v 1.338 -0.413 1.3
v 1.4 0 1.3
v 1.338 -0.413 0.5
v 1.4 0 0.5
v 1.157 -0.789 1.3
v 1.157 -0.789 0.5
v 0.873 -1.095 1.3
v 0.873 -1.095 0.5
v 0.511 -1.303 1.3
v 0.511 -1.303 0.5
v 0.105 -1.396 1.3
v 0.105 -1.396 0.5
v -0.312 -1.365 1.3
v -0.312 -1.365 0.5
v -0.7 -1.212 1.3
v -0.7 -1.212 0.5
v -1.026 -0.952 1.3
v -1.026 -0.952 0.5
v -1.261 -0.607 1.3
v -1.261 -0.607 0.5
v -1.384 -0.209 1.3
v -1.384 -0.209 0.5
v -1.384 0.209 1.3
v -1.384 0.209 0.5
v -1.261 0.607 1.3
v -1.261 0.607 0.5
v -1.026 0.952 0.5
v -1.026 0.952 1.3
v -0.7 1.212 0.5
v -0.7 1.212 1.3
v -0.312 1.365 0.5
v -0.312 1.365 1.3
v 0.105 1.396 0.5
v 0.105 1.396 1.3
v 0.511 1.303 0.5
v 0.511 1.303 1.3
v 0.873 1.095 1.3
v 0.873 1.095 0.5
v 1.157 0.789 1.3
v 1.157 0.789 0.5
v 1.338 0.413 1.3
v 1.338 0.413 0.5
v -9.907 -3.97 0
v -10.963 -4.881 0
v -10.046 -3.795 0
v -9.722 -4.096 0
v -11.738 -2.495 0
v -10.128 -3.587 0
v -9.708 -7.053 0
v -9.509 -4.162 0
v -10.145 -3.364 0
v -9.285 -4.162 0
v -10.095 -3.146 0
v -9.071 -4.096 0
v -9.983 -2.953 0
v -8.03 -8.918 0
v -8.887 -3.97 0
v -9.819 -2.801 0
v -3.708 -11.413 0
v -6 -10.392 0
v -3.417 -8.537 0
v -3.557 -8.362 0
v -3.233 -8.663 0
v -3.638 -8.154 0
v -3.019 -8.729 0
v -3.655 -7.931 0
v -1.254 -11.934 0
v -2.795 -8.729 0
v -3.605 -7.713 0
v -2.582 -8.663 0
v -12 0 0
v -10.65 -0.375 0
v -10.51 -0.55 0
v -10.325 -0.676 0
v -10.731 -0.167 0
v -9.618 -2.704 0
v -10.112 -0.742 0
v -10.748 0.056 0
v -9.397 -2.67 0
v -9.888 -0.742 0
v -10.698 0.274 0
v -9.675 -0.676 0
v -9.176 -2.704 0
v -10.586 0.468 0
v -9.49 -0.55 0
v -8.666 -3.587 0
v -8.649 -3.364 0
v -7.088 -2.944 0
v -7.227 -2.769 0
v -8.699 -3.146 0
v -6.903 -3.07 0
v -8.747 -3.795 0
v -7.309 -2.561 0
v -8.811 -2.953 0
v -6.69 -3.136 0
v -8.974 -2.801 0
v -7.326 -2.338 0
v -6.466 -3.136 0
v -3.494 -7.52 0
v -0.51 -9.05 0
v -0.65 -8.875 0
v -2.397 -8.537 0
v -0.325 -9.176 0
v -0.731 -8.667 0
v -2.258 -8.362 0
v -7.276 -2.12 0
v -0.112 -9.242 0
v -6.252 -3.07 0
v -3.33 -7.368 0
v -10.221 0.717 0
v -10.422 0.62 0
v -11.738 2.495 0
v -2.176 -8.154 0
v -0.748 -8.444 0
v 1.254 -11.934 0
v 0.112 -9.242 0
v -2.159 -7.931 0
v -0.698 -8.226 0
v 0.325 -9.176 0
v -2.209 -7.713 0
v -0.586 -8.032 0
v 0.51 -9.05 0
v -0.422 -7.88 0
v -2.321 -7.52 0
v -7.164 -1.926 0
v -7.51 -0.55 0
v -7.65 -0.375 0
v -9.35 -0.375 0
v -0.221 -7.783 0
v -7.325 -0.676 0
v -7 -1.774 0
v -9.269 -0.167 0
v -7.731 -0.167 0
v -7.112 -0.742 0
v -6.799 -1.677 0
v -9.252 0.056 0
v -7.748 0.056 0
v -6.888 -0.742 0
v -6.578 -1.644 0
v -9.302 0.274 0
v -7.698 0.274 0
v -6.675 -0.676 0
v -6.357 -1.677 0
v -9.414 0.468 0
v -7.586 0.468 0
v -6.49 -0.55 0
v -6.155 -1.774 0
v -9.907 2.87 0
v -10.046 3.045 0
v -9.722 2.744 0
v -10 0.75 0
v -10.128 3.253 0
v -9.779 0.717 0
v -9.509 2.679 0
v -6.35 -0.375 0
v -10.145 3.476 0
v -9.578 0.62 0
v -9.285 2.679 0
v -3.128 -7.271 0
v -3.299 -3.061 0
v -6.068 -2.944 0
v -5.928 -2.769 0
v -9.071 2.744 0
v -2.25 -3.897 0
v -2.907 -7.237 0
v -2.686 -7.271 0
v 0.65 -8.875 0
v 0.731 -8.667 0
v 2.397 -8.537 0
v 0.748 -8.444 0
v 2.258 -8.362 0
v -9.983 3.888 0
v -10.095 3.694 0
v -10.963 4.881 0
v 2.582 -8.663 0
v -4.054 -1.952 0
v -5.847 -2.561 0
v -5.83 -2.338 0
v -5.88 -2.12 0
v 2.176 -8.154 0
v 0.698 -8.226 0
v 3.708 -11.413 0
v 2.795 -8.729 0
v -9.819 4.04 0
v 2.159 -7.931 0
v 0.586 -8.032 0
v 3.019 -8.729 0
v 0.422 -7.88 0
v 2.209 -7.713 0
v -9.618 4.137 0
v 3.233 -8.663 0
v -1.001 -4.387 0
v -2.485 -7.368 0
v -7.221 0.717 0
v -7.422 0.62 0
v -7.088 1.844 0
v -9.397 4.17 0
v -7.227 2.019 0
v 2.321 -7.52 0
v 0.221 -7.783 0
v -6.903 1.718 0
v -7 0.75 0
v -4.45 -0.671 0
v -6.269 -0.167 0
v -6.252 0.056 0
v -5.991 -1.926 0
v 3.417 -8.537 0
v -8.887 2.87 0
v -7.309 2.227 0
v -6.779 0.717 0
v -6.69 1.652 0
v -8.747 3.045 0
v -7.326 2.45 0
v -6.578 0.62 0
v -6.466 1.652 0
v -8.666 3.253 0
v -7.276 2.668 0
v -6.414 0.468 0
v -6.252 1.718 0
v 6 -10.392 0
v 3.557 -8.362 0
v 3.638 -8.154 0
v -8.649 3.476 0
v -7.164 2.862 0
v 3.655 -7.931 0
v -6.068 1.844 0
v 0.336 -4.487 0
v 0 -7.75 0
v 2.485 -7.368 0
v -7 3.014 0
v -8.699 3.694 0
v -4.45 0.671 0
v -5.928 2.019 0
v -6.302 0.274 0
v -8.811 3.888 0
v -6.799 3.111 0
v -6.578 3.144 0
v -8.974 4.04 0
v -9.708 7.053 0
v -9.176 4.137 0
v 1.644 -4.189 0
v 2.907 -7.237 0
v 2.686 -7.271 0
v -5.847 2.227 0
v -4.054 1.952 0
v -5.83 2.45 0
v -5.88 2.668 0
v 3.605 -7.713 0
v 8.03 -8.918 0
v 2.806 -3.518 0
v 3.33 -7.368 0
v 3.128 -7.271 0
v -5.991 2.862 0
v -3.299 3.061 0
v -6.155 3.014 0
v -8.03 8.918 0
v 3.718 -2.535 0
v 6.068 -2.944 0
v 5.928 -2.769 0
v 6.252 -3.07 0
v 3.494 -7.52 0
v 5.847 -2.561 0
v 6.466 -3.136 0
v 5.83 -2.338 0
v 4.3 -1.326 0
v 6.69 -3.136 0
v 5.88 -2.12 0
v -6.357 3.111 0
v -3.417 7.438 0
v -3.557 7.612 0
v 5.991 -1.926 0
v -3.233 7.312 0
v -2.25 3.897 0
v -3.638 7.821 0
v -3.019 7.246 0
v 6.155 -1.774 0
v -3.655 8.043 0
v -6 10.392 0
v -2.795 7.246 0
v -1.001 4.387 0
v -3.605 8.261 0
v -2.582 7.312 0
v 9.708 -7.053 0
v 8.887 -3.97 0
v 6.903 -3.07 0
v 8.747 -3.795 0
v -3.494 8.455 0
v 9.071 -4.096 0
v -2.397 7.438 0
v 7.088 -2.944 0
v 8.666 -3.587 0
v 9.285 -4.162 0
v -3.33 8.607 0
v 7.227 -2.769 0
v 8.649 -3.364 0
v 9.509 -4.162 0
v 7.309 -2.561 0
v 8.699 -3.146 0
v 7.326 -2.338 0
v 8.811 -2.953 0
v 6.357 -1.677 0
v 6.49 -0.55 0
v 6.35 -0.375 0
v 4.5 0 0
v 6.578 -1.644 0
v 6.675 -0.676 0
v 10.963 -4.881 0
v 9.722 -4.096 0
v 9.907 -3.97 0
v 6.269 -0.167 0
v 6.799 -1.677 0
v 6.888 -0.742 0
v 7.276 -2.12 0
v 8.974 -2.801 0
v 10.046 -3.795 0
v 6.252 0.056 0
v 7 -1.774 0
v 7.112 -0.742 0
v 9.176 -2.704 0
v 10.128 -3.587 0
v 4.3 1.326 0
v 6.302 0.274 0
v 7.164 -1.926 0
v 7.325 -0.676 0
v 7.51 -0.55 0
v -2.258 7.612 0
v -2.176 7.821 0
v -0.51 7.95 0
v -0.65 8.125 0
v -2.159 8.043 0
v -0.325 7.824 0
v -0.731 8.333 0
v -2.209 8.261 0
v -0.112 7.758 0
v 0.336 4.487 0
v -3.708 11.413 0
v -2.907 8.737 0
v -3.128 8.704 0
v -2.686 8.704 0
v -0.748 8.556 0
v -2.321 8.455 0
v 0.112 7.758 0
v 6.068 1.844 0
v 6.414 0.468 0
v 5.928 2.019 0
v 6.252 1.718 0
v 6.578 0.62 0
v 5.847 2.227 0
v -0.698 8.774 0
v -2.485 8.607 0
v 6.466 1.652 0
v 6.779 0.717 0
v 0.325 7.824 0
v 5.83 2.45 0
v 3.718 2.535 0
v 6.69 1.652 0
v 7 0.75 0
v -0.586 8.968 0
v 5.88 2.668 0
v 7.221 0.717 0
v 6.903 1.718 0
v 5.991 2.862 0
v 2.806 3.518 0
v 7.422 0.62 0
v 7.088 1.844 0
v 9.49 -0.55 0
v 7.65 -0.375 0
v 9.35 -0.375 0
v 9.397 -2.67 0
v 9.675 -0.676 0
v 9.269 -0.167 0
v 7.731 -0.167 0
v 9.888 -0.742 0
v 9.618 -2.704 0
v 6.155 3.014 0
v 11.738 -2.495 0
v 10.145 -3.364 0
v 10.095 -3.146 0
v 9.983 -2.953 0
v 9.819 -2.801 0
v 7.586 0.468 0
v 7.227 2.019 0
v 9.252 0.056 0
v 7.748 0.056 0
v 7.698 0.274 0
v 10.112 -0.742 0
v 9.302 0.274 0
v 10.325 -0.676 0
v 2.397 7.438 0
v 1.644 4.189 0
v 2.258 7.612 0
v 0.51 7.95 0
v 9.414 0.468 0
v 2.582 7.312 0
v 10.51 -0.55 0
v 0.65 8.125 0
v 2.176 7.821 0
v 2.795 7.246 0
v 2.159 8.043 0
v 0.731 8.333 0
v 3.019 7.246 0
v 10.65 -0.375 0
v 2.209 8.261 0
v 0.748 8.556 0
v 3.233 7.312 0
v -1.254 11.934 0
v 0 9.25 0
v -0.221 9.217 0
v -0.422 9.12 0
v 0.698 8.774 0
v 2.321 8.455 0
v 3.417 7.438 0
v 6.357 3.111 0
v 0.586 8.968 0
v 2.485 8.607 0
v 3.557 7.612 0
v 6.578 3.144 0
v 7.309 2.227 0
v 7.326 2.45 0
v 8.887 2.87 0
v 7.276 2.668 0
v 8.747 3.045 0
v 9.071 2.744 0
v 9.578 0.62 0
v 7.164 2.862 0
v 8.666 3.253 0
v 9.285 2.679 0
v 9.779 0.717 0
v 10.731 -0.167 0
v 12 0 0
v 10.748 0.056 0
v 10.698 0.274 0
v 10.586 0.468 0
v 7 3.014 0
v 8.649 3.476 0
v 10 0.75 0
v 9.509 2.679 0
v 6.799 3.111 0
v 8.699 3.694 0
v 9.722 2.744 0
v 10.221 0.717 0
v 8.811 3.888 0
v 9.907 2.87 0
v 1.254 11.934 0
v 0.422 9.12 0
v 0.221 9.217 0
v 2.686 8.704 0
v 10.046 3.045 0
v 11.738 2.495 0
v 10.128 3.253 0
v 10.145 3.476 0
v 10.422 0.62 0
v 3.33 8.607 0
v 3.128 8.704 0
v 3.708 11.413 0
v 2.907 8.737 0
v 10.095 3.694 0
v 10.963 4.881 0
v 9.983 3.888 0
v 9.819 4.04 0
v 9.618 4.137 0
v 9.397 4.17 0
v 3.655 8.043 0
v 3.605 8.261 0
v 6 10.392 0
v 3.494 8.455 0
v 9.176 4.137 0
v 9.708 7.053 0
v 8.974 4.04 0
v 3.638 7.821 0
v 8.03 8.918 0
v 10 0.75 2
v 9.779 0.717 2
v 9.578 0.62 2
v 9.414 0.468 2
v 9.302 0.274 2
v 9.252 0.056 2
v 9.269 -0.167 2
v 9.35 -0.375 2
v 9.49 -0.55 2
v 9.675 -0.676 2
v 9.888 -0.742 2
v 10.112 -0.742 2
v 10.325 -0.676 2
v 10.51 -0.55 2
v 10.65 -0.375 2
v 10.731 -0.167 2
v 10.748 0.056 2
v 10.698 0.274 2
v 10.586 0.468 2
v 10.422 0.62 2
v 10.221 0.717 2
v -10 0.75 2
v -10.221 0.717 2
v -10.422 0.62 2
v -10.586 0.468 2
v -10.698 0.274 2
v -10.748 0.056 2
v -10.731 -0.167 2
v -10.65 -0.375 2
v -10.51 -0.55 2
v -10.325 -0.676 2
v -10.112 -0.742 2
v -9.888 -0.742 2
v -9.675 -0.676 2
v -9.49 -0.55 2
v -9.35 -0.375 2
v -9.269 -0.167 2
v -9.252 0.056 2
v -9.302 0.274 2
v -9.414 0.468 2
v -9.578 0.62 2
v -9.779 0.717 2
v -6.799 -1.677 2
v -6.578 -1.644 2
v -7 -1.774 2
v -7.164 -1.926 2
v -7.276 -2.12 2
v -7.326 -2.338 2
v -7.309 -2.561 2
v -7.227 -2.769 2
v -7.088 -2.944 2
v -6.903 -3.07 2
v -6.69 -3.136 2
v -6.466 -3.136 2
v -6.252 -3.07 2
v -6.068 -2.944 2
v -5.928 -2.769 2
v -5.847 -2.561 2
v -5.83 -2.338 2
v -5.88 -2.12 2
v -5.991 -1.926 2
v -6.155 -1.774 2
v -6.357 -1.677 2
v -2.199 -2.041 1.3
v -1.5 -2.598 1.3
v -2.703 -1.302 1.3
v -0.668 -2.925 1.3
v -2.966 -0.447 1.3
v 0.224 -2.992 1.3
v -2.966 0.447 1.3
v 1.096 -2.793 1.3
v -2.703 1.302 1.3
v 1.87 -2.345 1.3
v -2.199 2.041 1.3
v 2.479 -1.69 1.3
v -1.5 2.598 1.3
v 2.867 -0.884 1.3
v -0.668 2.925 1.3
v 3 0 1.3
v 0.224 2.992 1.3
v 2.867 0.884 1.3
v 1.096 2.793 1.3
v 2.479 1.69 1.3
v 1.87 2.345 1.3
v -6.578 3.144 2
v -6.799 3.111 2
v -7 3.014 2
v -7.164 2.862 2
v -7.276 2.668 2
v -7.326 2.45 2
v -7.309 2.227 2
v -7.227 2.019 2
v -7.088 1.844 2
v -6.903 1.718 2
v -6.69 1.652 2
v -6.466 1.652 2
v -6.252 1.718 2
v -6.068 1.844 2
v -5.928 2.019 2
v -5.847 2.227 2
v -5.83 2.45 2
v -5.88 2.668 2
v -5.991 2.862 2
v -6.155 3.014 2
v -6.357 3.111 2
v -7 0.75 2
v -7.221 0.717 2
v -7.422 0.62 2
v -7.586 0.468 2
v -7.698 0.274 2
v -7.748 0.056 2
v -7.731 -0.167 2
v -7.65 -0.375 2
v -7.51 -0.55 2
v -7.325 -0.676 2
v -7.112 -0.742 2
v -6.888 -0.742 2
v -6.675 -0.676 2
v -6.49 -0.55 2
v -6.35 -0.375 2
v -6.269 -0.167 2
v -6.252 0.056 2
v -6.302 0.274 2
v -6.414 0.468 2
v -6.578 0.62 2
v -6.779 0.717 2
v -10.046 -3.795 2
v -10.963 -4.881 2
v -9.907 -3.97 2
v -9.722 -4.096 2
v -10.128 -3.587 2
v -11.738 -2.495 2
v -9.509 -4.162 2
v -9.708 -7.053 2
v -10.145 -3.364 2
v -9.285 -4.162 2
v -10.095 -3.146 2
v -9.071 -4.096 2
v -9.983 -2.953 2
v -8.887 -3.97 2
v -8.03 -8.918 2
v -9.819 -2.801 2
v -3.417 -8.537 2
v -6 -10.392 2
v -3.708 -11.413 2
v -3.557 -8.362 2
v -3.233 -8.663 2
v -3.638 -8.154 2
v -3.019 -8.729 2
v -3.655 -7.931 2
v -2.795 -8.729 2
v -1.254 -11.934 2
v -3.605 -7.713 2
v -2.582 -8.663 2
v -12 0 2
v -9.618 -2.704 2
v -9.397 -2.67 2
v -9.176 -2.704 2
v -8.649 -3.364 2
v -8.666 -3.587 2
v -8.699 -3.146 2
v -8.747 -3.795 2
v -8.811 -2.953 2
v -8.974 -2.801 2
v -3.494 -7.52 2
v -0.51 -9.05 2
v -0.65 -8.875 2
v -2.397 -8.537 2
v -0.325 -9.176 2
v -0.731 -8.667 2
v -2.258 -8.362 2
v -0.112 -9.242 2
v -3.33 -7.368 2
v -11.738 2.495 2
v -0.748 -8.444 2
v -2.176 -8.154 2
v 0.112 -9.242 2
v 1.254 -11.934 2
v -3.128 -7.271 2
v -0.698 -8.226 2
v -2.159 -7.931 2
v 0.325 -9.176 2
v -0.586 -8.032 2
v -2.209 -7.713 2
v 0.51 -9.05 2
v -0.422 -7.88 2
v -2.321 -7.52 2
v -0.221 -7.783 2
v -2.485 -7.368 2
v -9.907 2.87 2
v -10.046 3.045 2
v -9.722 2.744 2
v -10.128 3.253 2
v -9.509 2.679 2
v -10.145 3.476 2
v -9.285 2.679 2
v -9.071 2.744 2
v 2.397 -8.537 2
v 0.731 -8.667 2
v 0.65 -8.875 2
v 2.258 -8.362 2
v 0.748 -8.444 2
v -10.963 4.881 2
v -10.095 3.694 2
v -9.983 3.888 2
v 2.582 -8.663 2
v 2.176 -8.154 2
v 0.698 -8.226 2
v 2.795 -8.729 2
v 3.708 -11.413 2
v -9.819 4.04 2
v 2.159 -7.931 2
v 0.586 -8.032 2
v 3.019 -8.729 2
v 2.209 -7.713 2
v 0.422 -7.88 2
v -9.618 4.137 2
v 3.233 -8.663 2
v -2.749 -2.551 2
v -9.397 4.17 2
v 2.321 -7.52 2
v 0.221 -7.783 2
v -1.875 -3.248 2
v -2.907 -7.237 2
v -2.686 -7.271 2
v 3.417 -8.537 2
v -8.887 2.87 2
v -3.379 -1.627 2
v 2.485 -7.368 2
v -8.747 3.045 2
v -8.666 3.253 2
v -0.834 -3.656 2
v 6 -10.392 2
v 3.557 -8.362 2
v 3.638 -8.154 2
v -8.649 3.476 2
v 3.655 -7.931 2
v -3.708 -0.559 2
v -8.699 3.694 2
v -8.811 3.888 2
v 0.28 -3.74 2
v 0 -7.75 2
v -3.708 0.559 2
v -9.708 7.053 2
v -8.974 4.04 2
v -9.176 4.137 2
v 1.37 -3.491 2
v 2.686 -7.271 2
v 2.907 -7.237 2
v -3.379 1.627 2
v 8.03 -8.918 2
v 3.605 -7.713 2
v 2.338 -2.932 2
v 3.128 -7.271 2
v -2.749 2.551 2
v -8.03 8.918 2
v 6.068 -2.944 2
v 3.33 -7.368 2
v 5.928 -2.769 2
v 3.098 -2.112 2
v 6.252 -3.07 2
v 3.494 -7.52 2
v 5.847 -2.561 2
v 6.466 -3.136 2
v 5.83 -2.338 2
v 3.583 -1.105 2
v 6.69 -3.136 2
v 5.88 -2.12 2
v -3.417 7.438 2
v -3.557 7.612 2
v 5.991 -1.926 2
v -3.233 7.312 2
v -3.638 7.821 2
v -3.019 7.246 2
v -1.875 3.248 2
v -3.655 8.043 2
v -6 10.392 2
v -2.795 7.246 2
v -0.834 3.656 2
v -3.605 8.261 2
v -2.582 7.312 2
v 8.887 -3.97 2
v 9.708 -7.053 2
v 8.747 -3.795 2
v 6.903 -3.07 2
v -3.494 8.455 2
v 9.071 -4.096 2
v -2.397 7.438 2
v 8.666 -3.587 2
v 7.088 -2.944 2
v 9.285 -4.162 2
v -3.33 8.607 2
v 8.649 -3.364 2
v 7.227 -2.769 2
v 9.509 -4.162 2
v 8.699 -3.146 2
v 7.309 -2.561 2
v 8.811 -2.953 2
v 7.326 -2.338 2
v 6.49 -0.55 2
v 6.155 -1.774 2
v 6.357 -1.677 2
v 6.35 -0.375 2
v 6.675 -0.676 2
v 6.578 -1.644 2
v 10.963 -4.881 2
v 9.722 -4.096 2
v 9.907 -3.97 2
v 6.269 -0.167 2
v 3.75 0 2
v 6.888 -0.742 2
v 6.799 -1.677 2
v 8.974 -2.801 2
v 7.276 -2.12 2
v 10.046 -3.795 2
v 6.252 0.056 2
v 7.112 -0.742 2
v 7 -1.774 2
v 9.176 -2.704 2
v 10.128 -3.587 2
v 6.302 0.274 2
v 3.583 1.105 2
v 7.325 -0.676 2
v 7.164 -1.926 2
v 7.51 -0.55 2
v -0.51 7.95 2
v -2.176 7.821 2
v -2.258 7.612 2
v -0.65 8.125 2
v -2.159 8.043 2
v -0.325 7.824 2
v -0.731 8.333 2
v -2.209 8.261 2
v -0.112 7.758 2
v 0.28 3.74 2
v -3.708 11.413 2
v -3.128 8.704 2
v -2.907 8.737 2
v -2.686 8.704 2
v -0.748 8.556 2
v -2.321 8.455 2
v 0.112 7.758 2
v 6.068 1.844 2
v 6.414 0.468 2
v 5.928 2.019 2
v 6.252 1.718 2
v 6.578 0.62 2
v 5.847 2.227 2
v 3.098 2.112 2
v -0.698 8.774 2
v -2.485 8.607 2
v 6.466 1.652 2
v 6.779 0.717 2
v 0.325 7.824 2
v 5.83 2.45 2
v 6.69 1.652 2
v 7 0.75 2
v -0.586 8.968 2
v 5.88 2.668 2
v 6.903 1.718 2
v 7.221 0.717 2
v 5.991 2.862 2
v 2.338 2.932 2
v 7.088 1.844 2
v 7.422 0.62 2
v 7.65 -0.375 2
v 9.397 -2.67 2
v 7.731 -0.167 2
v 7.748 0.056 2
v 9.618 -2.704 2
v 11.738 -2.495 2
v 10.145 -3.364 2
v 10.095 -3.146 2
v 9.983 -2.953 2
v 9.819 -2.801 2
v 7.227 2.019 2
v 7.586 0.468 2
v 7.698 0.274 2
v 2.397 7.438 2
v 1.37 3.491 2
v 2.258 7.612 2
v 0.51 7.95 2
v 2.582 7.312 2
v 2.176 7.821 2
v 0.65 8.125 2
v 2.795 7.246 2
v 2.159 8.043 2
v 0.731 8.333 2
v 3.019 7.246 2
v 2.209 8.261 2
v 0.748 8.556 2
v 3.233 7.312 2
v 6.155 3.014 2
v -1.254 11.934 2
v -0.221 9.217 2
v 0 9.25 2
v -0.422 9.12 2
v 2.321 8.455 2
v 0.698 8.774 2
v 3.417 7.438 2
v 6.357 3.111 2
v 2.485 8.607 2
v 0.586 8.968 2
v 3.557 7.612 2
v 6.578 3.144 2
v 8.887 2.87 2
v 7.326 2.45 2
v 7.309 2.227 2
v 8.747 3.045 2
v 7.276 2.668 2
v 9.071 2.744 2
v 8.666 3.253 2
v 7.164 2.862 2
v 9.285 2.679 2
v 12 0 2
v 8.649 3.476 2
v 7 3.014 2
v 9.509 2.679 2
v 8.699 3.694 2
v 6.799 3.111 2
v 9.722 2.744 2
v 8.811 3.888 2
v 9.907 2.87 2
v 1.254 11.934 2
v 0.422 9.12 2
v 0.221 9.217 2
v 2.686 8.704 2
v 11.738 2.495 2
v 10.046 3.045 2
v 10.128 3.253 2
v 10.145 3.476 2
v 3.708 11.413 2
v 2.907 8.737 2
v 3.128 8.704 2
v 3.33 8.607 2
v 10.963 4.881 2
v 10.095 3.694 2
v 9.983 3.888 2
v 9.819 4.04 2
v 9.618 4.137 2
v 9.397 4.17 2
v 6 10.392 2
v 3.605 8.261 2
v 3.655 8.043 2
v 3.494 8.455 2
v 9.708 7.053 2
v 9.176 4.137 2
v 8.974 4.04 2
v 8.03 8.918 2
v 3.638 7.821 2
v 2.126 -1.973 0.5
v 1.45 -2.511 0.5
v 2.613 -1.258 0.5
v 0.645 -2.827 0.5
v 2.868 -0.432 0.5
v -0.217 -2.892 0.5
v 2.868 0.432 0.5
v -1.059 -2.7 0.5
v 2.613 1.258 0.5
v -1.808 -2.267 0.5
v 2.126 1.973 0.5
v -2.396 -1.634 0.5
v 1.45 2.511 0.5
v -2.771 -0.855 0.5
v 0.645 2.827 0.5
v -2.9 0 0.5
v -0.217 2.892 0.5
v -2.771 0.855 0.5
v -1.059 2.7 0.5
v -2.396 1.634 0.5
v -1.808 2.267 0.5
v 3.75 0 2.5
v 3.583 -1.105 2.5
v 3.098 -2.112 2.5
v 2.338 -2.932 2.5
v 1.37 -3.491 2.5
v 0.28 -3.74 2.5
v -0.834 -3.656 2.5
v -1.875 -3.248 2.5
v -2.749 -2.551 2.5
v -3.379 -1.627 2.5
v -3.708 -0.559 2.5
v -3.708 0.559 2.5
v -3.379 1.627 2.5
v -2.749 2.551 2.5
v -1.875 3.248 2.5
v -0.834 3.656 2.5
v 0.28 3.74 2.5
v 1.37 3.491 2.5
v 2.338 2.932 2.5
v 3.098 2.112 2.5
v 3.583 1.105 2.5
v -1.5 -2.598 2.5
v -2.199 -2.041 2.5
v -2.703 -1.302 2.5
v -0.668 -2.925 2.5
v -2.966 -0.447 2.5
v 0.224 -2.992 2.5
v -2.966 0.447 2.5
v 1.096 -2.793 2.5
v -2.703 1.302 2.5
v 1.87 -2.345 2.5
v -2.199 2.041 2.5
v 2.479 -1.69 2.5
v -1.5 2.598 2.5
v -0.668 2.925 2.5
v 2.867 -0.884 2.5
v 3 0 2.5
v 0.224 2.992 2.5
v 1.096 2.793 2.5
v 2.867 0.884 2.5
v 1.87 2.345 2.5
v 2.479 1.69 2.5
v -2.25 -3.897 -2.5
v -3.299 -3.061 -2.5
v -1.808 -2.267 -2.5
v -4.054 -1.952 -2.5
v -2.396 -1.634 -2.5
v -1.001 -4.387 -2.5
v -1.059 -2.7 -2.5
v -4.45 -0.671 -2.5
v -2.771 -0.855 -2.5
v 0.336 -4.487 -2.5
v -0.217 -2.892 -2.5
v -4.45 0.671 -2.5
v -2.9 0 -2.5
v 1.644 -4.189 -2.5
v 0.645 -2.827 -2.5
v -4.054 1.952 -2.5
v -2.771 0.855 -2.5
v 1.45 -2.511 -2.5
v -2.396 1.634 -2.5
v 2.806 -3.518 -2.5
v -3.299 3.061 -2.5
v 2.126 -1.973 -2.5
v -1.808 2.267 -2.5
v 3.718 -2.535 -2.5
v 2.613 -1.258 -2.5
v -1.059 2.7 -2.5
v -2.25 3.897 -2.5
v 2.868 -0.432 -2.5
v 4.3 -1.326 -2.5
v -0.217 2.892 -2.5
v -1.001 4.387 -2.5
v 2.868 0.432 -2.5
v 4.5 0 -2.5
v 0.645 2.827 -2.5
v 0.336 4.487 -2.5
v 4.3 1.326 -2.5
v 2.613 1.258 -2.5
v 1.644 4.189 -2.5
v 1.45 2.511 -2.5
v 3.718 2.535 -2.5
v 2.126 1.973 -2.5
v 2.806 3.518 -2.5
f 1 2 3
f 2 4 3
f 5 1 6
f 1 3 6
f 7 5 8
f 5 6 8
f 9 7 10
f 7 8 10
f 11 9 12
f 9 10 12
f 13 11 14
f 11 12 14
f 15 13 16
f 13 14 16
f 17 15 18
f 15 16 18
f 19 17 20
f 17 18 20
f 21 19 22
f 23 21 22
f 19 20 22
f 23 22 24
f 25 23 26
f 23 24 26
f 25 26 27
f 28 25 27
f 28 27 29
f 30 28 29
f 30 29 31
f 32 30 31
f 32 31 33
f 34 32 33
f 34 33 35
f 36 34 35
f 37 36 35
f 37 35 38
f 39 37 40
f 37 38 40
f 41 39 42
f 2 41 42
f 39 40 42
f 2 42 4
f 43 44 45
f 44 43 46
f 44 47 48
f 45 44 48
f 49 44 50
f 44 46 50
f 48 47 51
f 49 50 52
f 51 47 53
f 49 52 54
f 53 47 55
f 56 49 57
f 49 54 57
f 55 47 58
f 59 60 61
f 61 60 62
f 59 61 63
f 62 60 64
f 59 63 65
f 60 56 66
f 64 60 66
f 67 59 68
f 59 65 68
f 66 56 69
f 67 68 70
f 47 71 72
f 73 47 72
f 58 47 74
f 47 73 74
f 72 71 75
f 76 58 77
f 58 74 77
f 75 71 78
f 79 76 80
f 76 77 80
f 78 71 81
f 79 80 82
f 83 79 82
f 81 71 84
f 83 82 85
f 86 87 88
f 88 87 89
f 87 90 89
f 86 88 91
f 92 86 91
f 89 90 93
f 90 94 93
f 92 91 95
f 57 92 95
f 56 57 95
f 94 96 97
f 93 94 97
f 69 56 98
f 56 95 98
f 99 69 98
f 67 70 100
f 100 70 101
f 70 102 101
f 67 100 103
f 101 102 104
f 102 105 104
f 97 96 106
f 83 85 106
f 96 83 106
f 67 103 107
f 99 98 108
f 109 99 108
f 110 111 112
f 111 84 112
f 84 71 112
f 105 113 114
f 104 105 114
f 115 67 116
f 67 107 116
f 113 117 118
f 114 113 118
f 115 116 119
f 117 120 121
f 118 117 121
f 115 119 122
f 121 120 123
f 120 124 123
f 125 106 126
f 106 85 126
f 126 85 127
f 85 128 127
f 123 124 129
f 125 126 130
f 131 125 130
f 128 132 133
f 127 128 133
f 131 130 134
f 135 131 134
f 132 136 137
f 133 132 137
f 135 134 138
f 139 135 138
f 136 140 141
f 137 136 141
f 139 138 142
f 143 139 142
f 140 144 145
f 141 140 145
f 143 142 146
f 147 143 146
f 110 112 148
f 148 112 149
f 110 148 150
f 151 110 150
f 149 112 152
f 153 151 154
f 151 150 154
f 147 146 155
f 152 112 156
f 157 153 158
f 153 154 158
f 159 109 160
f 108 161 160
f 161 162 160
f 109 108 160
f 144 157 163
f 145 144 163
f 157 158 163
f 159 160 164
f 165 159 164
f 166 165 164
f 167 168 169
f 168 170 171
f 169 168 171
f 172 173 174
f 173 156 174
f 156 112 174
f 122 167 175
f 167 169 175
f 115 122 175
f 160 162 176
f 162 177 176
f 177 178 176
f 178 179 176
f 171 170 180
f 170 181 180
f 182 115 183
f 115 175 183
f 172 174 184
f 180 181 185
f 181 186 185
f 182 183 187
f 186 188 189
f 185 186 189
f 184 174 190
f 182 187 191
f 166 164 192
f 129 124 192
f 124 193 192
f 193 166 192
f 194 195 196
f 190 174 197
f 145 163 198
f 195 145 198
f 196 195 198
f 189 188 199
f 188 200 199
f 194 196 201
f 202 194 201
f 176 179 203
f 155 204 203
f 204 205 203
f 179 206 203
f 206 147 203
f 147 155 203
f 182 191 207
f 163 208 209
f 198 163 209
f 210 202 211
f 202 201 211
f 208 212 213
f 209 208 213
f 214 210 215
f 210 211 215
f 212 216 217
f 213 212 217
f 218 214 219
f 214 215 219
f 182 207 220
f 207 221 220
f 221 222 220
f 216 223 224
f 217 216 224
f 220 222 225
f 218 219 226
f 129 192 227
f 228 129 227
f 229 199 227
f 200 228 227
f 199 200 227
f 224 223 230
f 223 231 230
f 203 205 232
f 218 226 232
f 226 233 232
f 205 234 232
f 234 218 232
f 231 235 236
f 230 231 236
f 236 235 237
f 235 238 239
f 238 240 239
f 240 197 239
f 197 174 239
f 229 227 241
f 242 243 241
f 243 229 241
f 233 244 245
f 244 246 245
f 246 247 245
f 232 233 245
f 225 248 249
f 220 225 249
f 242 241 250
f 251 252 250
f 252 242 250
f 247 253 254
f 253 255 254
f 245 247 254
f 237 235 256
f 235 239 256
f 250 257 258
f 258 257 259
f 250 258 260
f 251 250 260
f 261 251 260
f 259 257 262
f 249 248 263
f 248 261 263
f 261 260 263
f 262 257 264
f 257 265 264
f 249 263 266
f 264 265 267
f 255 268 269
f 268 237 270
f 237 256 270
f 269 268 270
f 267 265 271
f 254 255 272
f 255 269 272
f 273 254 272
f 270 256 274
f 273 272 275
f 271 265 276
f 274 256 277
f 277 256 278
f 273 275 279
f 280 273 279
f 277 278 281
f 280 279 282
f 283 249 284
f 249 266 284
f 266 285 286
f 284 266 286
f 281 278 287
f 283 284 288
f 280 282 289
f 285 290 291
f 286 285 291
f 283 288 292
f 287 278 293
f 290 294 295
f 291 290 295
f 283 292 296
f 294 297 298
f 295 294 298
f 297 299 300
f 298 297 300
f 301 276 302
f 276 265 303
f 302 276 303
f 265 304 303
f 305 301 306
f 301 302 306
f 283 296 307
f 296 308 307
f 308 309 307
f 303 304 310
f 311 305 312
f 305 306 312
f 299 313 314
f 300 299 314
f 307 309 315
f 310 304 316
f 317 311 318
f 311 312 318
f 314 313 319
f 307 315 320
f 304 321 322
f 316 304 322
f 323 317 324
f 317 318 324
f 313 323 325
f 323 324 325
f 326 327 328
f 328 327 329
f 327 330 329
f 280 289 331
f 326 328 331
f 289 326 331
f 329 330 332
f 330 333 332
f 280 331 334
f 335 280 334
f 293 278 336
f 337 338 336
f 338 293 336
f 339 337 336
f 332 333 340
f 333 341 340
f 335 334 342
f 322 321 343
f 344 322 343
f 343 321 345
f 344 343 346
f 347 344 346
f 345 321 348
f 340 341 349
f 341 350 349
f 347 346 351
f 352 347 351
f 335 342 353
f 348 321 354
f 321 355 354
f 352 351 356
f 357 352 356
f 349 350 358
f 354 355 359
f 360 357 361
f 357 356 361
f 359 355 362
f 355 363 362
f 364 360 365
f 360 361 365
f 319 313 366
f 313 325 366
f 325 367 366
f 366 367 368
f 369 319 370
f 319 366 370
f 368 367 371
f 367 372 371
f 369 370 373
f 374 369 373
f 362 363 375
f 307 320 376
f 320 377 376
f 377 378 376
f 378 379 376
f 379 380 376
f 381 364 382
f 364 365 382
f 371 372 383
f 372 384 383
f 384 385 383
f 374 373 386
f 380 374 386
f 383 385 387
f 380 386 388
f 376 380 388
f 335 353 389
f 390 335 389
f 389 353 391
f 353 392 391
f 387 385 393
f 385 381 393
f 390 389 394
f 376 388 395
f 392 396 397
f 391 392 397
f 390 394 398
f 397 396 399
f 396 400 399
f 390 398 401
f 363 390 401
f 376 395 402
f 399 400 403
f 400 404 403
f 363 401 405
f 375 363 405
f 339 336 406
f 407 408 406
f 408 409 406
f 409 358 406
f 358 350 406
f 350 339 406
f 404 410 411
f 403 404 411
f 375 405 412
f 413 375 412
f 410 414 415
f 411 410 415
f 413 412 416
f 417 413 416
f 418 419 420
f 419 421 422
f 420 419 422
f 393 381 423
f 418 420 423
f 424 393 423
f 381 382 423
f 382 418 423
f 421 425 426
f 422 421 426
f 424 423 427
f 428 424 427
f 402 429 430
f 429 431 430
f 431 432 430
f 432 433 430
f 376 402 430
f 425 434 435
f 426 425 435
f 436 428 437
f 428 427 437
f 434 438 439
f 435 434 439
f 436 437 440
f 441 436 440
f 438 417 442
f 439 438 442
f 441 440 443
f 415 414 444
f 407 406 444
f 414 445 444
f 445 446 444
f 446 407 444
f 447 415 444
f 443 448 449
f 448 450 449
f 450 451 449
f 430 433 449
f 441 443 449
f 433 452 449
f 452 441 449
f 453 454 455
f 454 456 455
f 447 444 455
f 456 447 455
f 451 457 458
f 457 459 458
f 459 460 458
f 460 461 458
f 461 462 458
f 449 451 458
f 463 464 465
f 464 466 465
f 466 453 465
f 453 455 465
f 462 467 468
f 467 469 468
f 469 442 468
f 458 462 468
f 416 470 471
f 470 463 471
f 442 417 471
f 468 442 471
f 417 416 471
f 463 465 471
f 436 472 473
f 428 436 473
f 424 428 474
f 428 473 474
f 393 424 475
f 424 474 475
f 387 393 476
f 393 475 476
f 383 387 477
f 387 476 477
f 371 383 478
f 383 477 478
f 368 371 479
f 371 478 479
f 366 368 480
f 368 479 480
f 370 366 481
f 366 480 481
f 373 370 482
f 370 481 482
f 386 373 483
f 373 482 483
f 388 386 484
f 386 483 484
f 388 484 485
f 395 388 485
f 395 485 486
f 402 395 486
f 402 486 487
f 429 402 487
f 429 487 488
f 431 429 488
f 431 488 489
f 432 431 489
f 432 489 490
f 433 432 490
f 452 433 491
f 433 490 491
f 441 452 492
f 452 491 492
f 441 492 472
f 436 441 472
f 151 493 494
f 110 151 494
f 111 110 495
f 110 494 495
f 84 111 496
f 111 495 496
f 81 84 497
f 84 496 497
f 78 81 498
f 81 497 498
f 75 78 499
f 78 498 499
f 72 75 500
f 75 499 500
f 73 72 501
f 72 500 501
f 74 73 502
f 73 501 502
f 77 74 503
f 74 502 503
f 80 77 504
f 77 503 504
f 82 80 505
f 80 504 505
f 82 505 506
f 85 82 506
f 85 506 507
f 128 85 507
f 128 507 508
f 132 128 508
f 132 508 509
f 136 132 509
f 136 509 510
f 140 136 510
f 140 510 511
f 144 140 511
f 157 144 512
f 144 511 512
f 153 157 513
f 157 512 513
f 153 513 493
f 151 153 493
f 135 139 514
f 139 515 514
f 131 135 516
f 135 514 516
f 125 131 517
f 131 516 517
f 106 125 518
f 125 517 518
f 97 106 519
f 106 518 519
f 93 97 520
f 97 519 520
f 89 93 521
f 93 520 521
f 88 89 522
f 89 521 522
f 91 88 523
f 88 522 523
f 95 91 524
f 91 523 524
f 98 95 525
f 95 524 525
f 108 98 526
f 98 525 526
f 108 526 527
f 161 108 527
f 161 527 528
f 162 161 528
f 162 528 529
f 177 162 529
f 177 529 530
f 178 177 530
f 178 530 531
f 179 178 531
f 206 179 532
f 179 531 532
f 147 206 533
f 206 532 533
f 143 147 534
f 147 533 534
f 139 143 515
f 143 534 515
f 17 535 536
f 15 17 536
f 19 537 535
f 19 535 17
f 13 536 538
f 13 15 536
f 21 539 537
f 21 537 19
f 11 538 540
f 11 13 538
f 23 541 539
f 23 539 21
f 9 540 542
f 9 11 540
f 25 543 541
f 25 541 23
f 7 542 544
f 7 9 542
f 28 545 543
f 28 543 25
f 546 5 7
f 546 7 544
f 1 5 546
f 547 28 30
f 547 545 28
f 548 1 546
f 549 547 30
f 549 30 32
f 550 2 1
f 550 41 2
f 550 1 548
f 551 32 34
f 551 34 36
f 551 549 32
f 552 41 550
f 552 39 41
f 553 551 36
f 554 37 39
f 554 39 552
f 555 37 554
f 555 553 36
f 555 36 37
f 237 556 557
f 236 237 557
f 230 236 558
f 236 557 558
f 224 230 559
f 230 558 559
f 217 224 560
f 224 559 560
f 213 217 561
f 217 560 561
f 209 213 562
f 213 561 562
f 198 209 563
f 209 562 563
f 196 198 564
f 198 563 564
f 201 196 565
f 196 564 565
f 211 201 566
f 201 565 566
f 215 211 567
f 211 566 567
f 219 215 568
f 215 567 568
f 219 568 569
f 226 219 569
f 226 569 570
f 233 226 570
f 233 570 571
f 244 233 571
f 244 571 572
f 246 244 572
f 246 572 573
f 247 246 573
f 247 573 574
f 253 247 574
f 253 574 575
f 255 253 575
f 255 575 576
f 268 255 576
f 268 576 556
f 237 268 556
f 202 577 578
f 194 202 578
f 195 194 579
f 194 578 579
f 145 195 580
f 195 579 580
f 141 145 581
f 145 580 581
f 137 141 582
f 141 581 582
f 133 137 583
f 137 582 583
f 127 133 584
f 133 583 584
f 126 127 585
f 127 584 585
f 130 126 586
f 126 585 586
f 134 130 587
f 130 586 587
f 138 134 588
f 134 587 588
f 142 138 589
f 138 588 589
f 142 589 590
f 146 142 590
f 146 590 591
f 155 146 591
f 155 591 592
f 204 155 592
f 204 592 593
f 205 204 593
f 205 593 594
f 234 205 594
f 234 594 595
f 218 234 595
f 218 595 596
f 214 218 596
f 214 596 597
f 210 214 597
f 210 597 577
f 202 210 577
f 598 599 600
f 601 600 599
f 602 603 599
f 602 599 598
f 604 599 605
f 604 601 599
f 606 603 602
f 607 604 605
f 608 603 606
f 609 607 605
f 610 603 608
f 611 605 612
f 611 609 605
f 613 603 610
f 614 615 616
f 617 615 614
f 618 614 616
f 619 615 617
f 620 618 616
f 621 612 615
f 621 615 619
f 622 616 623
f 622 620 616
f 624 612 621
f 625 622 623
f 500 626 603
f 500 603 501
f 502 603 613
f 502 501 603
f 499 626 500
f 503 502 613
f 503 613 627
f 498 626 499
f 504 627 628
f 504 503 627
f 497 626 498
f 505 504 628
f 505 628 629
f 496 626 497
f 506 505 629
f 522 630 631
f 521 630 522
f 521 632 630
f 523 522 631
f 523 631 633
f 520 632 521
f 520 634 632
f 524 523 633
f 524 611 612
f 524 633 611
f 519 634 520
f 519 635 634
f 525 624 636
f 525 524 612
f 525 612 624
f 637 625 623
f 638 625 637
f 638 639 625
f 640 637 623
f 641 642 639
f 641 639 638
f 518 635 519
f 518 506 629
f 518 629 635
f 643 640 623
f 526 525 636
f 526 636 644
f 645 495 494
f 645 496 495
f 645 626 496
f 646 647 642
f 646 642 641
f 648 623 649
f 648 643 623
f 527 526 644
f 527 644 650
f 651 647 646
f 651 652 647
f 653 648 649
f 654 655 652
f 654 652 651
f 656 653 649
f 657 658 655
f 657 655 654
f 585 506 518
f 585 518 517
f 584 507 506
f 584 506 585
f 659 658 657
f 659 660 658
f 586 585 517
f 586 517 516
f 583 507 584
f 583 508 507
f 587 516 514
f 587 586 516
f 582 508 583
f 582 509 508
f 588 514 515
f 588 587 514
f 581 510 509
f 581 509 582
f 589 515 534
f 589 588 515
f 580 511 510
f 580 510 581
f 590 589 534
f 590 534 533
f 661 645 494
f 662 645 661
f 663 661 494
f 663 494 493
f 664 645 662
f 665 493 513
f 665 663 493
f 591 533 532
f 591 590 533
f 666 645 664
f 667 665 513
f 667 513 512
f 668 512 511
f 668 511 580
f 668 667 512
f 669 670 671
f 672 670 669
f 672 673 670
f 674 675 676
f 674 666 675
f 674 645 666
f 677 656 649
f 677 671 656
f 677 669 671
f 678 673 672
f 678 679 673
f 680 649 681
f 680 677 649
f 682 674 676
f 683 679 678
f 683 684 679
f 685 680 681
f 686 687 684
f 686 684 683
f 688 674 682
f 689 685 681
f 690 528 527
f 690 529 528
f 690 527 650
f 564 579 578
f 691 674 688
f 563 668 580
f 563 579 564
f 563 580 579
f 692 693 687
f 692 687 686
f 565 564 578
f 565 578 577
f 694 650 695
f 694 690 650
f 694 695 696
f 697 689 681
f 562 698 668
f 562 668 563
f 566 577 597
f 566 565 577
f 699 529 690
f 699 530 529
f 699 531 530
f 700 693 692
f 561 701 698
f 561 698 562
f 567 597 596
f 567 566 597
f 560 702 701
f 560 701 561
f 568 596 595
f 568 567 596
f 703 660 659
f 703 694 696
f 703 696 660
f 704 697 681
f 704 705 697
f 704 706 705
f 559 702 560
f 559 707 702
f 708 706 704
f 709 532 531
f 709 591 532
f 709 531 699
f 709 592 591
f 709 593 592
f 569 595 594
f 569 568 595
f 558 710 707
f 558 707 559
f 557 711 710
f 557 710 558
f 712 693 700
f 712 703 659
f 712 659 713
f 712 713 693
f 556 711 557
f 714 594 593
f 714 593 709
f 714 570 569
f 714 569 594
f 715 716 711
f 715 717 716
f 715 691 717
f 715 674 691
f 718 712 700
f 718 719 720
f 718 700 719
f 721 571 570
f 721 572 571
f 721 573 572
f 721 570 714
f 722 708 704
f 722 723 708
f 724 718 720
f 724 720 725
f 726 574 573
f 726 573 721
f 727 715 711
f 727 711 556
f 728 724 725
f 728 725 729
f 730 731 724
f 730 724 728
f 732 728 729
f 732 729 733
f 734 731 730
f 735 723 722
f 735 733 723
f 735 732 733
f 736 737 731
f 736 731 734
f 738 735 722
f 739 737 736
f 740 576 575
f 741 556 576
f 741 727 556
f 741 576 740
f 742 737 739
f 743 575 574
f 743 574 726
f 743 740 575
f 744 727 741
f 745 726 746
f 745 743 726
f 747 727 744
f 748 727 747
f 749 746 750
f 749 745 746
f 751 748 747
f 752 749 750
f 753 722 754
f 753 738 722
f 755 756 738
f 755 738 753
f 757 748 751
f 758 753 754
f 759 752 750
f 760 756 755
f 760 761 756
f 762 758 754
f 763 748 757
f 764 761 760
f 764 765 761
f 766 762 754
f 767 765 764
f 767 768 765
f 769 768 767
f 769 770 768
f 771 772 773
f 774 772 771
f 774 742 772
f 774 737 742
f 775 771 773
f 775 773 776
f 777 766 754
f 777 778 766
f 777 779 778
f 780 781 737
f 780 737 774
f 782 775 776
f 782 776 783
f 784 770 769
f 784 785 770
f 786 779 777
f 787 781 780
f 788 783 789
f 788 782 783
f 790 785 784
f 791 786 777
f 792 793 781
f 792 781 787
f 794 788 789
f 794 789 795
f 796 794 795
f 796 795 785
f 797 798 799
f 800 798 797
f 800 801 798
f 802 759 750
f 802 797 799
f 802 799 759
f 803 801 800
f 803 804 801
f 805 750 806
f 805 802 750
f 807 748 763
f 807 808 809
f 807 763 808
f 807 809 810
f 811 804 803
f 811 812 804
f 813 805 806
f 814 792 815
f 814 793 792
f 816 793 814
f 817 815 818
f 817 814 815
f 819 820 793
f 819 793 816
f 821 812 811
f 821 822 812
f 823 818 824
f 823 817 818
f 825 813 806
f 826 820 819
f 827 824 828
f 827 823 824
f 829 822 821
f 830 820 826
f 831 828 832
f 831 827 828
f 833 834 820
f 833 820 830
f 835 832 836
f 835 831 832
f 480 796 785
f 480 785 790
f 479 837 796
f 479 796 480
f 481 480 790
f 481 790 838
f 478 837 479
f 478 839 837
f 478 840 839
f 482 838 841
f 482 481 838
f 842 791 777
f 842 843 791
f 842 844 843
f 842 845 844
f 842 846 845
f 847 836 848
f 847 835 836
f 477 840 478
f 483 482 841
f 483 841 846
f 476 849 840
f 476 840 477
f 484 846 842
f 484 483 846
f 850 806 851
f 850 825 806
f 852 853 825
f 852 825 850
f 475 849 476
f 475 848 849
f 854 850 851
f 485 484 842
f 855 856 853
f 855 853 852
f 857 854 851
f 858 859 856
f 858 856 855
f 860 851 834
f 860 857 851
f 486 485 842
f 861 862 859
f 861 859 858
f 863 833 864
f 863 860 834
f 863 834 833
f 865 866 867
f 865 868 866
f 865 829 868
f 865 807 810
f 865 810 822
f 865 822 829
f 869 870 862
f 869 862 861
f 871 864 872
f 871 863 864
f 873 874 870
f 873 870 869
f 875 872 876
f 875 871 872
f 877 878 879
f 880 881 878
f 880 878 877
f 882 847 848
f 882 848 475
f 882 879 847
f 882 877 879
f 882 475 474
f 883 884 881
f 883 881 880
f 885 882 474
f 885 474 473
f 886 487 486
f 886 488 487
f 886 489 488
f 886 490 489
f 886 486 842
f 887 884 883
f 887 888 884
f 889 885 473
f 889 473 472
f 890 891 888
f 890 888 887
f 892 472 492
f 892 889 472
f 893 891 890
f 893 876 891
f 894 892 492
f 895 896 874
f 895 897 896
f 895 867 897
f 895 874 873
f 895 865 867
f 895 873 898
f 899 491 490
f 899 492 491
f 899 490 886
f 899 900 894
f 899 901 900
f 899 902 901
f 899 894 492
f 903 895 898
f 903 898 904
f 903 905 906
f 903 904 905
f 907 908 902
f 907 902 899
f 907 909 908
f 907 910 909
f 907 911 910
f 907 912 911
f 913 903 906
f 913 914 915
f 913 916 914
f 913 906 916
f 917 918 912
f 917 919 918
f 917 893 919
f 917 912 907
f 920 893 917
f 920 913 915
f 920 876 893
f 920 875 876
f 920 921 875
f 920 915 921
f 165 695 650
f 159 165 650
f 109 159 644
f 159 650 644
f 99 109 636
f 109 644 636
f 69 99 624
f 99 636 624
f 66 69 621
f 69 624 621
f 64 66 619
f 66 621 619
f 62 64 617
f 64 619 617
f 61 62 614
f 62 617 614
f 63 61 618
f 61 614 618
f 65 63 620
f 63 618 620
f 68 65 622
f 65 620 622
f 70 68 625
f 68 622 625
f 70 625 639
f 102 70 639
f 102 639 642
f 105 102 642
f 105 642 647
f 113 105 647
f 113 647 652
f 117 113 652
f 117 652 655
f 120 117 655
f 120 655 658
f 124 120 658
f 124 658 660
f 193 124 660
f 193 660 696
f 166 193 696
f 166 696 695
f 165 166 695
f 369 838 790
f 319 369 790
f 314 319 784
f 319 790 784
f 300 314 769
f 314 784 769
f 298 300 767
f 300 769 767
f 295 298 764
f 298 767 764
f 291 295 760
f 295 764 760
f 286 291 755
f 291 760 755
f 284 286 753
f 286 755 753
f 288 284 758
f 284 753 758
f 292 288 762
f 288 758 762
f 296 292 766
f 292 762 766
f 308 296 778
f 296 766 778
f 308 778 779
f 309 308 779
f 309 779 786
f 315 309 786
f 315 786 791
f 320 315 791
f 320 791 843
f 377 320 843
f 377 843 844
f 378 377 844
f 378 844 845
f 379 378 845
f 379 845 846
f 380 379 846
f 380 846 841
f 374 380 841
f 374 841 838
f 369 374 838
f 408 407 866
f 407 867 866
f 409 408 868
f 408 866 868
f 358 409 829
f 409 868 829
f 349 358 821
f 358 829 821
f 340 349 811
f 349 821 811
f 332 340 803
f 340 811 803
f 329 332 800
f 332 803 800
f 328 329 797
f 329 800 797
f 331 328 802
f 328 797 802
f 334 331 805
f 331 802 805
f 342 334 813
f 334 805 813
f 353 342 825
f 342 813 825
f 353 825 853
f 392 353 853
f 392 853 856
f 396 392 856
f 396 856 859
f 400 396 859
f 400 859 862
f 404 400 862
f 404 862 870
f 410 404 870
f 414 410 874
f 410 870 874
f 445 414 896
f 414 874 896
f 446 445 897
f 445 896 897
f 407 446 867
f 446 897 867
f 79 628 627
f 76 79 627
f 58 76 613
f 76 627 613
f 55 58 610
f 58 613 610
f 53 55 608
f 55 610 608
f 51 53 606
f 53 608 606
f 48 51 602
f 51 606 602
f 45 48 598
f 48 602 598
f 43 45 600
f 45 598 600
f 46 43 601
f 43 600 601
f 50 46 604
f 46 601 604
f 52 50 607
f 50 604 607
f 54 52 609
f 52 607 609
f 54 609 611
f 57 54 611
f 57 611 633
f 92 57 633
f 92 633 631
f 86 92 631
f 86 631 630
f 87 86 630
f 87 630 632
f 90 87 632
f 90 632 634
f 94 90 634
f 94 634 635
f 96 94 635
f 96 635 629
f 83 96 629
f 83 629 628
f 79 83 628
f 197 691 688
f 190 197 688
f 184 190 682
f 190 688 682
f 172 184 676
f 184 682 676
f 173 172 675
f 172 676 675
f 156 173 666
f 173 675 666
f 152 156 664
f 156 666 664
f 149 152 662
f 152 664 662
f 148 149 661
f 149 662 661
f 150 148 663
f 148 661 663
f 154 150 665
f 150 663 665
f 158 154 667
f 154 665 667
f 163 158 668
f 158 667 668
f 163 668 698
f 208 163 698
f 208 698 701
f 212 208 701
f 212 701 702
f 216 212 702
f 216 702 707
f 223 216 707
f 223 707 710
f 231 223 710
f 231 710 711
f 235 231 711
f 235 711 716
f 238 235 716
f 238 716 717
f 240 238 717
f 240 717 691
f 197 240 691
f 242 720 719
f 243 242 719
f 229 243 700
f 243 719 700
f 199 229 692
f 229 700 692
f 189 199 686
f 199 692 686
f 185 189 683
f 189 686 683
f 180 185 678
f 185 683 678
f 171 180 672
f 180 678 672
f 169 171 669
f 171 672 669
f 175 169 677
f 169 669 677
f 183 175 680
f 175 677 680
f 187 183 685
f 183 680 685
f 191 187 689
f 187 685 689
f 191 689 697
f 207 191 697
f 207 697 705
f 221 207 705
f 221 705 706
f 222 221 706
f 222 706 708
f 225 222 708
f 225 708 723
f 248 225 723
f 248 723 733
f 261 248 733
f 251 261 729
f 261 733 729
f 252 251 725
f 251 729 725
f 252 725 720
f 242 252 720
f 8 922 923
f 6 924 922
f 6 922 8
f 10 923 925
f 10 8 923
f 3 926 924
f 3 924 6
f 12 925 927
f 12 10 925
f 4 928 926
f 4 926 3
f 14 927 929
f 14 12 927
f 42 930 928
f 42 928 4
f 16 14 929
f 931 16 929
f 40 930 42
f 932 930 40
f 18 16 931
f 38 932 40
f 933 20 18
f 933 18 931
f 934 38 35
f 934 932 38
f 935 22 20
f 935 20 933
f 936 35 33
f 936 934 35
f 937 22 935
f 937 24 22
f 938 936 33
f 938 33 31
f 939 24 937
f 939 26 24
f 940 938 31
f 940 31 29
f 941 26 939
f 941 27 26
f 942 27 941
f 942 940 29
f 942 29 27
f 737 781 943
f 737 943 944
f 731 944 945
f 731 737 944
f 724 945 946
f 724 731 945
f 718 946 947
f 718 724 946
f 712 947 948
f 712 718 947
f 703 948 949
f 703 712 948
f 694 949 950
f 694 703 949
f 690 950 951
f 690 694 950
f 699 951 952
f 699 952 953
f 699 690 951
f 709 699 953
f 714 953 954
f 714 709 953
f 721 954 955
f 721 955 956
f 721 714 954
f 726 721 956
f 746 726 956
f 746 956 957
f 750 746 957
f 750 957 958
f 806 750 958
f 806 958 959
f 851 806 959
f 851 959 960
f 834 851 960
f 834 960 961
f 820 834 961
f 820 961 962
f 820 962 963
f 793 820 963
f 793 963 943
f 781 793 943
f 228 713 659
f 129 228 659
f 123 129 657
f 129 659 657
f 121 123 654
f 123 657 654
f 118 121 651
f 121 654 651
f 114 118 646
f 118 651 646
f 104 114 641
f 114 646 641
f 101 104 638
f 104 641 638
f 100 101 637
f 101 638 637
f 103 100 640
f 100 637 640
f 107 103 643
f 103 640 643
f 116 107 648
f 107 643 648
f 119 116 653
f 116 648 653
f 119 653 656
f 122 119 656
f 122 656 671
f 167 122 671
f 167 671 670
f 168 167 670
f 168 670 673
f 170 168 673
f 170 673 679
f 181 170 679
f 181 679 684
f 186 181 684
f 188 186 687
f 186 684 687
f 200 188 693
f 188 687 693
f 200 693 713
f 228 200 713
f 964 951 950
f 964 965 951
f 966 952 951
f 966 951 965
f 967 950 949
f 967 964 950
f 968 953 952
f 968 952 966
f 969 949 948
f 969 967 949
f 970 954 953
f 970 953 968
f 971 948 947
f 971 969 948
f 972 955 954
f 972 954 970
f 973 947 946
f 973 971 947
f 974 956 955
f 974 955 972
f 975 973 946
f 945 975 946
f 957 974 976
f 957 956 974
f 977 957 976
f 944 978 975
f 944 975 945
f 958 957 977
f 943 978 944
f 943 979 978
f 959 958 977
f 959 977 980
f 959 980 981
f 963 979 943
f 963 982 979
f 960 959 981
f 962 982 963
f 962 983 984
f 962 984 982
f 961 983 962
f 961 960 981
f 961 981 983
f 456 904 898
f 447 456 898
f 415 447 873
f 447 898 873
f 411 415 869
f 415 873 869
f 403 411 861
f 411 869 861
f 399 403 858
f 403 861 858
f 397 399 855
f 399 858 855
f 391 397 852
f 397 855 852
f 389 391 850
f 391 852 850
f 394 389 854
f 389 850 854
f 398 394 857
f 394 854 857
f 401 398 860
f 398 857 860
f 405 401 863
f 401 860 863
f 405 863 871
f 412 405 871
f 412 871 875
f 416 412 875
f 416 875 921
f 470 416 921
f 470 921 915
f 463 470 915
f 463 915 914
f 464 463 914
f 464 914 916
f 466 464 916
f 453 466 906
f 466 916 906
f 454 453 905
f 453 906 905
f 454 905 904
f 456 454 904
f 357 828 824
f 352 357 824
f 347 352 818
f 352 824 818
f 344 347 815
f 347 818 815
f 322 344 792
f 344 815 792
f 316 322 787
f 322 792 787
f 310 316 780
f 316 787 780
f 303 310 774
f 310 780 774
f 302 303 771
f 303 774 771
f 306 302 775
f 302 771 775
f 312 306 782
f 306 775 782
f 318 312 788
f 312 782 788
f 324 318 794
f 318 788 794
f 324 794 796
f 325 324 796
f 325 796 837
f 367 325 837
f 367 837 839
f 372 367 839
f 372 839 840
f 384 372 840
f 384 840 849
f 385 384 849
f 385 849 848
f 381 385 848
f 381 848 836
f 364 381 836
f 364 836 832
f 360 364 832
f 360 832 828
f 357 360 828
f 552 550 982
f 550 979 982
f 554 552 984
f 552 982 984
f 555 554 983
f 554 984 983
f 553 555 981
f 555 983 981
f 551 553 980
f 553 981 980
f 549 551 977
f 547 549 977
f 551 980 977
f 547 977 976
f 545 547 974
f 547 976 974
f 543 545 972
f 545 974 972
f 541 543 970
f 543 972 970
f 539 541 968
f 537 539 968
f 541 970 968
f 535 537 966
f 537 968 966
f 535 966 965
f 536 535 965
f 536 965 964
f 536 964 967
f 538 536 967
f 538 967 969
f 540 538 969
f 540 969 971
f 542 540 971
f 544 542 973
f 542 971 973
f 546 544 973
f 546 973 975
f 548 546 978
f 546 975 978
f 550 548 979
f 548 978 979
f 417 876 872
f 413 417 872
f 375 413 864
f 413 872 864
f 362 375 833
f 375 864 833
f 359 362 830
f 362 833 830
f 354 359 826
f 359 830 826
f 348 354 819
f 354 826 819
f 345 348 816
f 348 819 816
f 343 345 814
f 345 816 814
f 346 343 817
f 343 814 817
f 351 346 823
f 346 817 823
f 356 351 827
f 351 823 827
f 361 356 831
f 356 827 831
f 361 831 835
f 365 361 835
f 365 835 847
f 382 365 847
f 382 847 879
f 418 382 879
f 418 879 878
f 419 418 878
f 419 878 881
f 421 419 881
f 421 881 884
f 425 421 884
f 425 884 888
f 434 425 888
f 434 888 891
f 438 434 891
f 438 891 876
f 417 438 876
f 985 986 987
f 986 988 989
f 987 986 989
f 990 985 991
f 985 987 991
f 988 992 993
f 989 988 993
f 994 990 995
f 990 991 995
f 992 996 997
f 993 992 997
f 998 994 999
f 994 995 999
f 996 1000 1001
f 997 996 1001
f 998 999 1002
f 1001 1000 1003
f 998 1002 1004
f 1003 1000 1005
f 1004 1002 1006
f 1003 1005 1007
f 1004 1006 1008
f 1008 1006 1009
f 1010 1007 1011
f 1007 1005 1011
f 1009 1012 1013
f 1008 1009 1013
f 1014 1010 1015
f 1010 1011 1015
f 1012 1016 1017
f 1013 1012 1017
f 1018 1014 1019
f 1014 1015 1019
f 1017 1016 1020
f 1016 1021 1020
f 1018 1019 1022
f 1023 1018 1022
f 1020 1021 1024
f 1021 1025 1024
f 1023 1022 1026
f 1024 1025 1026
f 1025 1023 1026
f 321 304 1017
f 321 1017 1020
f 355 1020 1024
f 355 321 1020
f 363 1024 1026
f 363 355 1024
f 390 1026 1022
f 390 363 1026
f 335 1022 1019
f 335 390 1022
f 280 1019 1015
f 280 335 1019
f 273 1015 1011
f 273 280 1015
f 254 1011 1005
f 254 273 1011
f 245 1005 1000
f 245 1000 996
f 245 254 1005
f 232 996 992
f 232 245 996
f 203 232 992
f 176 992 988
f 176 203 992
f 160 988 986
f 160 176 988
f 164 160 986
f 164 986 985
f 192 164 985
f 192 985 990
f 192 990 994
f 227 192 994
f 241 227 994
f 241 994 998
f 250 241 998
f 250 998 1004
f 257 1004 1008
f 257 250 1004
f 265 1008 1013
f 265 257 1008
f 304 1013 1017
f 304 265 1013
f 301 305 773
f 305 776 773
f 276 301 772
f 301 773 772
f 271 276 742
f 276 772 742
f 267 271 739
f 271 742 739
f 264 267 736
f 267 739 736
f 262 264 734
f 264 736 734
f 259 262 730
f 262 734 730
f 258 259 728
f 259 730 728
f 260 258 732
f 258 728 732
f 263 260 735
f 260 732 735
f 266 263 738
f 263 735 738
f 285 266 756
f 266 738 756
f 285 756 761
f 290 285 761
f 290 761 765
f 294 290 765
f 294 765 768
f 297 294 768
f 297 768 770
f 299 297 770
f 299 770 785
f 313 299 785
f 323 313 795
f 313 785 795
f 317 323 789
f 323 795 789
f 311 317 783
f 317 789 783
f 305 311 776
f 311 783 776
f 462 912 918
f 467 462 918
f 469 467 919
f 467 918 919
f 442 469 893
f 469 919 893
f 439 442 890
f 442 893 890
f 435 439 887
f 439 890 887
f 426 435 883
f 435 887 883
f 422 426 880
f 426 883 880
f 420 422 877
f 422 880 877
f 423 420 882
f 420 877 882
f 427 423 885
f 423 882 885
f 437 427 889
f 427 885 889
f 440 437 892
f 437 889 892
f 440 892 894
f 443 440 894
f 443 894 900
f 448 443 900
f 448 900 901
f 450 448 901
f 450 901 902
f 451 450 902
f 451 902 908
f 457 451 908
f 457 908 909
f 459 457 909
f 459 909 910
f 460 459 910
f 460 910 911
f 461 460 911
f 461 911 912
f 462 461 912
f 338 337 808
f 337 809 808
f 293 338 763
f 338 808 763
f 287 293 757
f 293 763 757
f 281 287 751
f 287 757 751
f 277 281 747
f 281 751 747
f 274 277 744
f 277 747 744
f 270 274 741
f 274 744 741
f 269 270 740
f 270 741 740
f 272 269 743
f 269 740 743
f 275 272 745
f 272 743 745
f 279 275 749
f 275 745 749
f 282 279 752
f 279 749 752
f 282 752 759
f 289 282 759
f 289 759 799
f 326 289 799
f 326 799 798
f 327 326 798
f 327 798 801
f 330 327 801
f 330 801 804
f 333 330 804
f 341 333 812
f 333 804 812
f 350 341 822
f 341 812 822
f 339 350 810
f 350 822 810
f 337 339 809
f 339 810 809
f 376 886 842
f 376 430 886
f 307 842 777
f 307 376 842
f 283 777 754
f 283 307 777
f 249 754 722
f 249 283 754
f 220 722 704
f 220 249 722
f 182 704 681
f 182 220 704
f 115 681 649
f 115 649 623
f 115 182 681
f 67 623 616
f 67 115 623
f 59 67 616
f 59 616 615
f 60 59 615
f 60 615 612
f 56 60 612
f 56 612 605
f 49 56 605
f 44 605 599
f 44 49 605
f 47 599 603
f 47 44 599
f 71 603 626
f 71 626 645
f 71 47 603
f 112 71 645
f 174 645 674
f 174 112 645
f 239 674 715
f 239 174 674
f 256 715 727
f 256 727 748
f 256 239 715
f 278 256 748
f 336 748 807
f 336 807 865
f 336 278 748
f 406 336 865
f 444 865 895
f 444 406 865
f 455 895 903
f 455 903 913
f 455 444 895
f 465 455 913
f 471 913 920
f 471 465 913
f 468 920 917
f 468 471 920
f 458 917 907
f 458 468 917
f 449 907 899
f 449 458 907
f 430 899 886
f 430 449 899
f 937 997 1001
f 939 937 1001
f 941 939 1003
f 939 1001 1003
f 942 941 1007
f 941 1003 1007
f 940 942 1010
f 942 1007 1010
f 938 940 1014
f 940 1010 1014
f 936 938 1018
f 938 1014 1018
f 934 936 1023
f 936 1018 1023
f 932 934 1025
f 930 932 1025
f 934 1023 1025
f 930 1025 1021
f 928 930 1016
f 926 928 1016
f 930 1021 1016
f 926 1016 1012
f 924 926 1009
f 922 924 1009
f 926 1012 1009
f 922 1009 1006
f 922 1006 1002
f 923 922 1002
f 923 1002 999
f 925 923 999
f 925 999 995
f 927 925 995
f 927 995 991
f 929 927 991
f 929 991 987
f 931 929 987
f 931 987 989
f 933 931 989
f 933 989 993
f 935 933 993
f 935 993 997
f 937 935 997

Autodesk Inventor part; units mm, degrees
ref_plane "YZ Plane" through (0, 0, 0) normal (1, 0, 0) x (0, 1, 0)
ref_plane "XZ Plane" through (0, 0, 0) normal (0, 1, 0) x (-1, 0, 0)
ref_plane "XY Plane" through (0, 0, 0) normal (0, 0, 1) x (1, 0, 0)
sketch "Sketch1" plane through (0, 0, 0) normal (0, 0, 1) x (1, 0, 0)
  line L0 (-16.8, 0) -> (16.8, 0) projected
  line L1 (0, 16.8) -> (0, -16.8) projected
  circle A0 centre (0, 0) radius 12
  dimension "d0" = 24
extrude "Extrusion1" add sketch "Sketch1" along normal blind 2
sketch "Sketch2" plane through (0, 0, 0) normal (0, 0, 1) x (1, 0, 0)
  line L0 (0, 16.8) -> (0, -16.8) projected
  line L1 (-16.8, 0) -> (16.8, 0) projected
  circle A0 centre (0, 0) radius 4.5
  dimension "d3" = 9
extrude "Extrusion2" add sketch "Sketch2" against normal blind 2.5
sketch "Sketch3" plane through (0, 0, -2.5) normal (0, 0, -1) x (-1, 0, 0)
  line L0 (-16.8, 0) -> (16.8, 0) projected
  line L1 (0, -16.8) -> (0, 16.8) projected
  circle A0 centre (0, 0) radius 2.9
  dimension "d6" = 5.8
extrude "Extrusion3" cut sketch "Sketch3" against normal blind 3
sketch "Sketch4" plane through (0, 0, 2) normal (0, 0, 1) x (1, 0, 0)
  line L0 (0, 16.8) -> (0, -16.8) projected
  line L1 (-16.8, 0) -> (16.8, 0) projected
  circle A0 centre (0, 0) radius 3.75
  dimension "d9" = 7.5
extrude "Extrusion4" add sketch "Sketch4" along normal blind 0.5
sketch "Sketch5" plane through (0, 0, 2.5) normal (0, 0, 1) x (1, 0, 0)
  line L0 (0, 16.8) -> (0, -16.8) projected
  line L1 (-16.8, 0) -> (16.8, 0) projected
  circle A0 centre (0, 0) radius 3
  dimension "d12" = 6
extrude "Extrusion5" cut sketch "Sketch5" against normal blind 1.2
sketch "Sketch6" plane through (0, 0, 0) normal (0, 0, 1) x (1, 0, 0)
  line L0 (0, 16.8) -> (0, -16.8) projected
  line L1 (-16.8, 0) -> (16.8, 0) projected
  circle A0 centre (0, 0) radius 1.4
  dimension "d15" = 2.8
extrude "Extrusion6" cut sketch "Sketch6" along normal through all
sketch "Sketch7" plane through (0, 0, 0) normal (0, 0, 1) x (1, 0, 0)
  line L0 (0, 16.8) -> (0, -16.8) projected
  line L1 (-16.8, 0) -> (16.8, 0) projected
  circle A0 centre (0, 0) radius 8.5 construction
  line L2 (-2.9072, 7.9874) -> (2.9072, -7.9874) construction
  line L3 (2.9072, 7.9874) -> (-2.9072, -7.9874) construction
  point P0 (0, 8.5)
  point P1 (0, -8.5)
  dimension "d18" = 17
  dimension "d20" = 20
hole "Hole1" at (0, 8.5, 0) at (0, -8.5, 0) at (2.9072, 7.9874, 0) at (-2.9072, 7.9874, 0) at (2.9072, -7.9874, 0) at (-2.9072, -7.9874, 0) direction (0, 0, 1) diameter 1.5 depth 8 tip angle 118
sketch "Sketch8" plane through (0, 0, 0) normal (0, 0, 1) x (1, 0, 0)
  line L0 (0, 16.8) -> (0, -16.8) projected
  line L1 (-16.8, 0) -> (16.8, 0) projected
  circle A0 centre (0, 0) radius 10 construction
  line L2 (9.3969, 3.4202) -> (-9.3969, -3.4202) construction
  line L3 (-9.3969, 3.4202) -> (9.3969, -3.4202) construction
  circle A1 centre (0, 0) radius 7 construction
  point P0 (-10, 0)
  point P1 (10, 0)
  point P2 (-6.5778, 2.3941)
  point P3 (-7, 0)
  point P4 (-6.5778, -2.3941)
  point P5 (6.5778, 2.3941)
  point P6 (7, 0)
  point P7 (6.5778, -2.3941)
  dimension "d28" = 20
  dimension "d30" = 40
  dimension "d31" = 14
hole "Hole2" at (-10, 0, 0) at (-9.3969, 3.4202, 0) at (-9.3969, -3.4202, 0) at (10, 0, 0) at (9.3969, 3.4202, 0) at (9.3969, -3.4202, 0) at (-6.5778, 2.3941, 0) at (-7, 0, 0) at (-6.5778, -2.3941, 0) at (6.5778, 2.3941, 0) at (7, 0, 0) at (6.5778, -2.3941, 0) direction (0, 0, 1) diameter 1.5 depth 8 tip angle 118
properties part number "servo motor HS-7955TG round horn"
